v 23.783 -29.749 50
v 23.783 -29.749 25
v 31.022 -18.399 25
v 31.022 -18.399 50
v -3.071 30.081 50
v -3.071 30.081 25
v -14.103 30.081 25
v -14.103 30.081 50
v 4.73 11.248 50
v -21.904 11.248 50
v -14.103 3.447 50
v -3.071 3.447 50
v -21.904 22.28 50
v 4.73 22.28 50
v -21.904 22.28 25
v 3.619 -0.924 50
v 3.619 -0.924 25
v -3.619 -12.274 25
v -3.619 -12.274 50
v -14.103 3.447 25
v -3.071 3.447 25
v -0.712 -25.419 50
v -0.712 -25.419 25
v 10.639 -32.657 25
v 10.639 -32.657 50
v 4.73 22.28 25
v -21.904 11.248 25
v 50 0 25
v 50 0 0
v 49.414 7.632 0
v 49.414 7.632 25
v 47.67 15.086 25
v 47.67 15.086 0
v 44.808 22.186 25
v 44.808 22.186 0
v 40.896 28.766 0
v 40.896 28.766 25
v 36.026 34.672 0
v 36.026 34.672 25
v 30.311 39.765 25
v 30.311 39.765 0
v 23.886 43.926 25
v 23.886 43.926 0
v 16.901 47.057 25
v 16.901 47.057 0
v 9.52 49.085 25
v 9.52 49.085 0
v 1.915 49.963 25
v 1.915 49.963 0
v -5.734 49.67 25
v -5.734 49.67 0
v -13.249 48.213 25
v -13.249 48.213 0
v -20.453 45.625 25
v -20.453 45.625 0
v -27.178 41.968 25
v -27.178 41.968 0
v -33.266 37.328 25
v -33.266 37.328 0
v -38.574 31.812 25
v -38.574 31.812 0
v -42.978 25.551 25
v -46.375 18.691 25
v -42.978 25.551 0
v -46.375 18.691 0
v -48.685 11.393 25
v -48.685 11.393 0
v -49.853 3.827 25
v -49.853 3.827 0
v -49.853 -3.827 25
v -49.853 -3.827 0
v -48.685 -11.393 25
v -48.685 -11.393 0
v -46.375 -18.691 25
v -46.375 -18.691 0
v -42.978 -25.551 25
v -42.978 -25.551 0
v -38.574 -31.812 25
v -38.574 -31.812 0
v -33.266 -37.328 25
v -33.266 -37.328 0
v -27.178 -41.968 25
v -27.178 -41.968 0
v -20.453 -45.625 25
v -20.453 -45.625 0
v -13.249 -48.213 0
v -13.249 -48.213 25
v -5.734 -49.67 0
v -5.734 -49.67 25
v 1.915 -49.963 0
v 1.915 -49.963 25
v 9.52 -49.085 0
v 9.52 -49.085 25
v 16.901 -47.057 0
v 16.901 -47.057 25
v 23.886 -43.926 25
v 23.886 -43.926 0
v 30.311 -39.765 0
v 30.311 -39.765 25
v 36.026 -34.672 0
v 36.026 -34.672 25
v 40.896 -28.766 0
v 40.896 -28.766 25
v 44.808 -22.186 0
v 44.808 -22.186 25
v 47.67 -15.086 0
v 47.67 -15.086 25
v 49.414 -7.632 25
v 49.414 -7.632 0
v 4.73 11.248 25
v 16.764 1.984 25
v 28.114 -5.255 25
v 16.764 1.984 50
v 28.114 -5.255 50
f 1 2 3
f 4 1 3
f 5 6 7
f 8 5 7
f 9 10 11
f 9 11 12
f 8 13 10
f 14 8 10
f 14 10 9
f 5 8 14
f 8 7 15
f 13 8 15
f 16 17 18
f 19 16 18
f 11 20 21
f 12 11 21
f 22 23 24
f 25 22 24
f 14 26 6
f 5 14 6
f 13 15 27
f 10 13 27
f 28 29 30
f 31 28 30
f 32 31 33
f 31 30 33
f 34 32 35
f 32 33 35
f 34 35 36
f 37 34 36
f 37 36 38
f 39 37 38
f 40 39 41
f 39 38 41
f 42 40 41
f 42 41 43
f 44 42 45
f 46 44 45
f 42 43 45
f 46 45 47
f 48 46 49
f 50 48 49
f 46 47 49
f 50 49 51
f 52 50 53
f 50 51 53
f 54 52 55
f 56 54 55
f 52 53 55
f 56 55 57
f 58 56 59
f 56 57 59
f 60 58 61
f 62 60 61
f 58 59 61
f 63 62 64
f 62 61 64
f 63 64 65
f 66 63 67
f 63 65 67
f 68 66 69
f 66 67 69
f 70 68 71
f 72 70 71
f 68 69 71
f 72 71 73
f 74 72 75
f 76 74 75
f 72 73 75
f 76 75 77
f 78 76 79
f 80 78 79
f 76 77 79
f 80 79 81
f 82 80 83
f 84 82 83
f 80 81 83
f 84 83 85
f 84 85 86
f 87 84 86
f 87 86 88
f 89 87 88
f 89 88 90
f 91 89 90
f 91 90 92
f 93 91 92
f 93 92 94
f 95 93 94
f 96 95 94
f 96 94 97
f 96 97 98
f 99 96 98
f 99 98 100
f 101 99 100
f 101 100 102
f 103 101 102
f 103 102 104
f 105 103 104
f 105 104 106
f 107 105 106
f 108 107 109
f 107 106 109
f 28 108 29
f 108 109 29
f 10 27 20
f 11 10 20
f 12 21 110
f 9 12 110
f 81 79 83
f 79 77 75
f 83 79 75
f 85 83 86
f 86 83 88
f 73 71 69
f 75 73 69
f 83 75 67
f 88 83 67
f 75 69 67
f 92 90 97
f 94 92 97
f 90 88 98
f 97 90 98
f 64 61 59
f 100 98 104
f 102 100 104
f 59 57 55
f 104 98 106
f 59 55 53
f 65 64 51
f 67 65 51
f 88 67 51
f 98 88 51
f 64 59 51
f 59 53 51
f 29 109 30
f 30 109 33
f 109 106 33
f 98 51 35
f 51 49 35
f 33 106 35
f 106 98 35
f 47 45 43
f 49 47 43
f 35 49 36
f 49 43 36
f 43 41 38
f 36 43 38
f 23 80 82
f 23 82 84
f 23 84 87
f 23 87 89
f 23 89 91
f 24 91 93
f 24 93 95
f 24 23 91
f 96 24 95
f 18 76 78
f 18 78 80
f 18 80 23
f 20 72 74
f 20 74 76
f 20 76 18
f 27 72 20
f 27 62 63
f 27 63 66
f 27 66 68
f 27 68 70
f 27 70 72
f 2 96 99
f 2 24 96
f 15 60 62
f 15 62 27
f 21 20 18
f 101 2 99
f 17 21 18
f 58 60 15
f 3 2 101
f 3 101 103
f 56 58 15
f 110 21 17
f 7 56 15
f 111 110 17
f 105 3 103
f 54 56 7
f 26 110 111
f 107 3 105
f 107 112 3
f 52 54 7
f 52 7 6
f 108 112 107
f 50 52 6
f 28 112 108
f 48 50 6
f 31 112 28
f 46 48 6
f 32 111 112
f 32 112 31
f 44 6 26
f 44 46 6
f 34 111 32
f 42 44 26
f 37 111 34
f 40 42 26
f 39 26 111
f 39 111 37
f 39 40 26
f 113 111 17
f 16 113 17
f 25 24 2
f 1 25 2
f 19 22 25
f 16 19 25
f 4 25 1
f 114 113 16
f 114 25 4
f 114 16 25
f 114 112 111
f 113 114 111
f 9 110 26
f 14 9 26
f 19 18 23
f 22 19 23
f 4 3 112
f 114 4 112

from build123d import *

# Parameters (mm, degrees)
F0_R     = 50
F1_DEPTH = 25
F3_DEPTH = 25


with BuildPart() as f1:
    # F0 (on Top) → F1 (new body)
    with BuildSketch(Plane.XY):
        Circle(F0_R)
    extrude(amount=F1_DEPTH)

    # F2 (on face) → F3 (join)
    with BuildSketch(Plane.XY.offset(25)):
        Polygon((3.619255, -0.923771), (-3.619255, -12.274176), (-0.711706, -25.418523), (10.638699, -32.657032), (23.783046, -29.749483), (31.021555, -18.399078), (28.114006, -5.254732), (16.763601, 1.983778), align=None)
        Polygon((-3.070575, 30.081054), (-14.102733, 30.081054), (-21.903647, 22.28014), (-21.903647, 11.247983), (-14.102733, 3.447069), (-3.070575, 3.447069), (4.730338, 11.247983), (4.730338, 22.28014), align=None)
    extrude(amount=F3_DEPTH)


solid = f1.part
